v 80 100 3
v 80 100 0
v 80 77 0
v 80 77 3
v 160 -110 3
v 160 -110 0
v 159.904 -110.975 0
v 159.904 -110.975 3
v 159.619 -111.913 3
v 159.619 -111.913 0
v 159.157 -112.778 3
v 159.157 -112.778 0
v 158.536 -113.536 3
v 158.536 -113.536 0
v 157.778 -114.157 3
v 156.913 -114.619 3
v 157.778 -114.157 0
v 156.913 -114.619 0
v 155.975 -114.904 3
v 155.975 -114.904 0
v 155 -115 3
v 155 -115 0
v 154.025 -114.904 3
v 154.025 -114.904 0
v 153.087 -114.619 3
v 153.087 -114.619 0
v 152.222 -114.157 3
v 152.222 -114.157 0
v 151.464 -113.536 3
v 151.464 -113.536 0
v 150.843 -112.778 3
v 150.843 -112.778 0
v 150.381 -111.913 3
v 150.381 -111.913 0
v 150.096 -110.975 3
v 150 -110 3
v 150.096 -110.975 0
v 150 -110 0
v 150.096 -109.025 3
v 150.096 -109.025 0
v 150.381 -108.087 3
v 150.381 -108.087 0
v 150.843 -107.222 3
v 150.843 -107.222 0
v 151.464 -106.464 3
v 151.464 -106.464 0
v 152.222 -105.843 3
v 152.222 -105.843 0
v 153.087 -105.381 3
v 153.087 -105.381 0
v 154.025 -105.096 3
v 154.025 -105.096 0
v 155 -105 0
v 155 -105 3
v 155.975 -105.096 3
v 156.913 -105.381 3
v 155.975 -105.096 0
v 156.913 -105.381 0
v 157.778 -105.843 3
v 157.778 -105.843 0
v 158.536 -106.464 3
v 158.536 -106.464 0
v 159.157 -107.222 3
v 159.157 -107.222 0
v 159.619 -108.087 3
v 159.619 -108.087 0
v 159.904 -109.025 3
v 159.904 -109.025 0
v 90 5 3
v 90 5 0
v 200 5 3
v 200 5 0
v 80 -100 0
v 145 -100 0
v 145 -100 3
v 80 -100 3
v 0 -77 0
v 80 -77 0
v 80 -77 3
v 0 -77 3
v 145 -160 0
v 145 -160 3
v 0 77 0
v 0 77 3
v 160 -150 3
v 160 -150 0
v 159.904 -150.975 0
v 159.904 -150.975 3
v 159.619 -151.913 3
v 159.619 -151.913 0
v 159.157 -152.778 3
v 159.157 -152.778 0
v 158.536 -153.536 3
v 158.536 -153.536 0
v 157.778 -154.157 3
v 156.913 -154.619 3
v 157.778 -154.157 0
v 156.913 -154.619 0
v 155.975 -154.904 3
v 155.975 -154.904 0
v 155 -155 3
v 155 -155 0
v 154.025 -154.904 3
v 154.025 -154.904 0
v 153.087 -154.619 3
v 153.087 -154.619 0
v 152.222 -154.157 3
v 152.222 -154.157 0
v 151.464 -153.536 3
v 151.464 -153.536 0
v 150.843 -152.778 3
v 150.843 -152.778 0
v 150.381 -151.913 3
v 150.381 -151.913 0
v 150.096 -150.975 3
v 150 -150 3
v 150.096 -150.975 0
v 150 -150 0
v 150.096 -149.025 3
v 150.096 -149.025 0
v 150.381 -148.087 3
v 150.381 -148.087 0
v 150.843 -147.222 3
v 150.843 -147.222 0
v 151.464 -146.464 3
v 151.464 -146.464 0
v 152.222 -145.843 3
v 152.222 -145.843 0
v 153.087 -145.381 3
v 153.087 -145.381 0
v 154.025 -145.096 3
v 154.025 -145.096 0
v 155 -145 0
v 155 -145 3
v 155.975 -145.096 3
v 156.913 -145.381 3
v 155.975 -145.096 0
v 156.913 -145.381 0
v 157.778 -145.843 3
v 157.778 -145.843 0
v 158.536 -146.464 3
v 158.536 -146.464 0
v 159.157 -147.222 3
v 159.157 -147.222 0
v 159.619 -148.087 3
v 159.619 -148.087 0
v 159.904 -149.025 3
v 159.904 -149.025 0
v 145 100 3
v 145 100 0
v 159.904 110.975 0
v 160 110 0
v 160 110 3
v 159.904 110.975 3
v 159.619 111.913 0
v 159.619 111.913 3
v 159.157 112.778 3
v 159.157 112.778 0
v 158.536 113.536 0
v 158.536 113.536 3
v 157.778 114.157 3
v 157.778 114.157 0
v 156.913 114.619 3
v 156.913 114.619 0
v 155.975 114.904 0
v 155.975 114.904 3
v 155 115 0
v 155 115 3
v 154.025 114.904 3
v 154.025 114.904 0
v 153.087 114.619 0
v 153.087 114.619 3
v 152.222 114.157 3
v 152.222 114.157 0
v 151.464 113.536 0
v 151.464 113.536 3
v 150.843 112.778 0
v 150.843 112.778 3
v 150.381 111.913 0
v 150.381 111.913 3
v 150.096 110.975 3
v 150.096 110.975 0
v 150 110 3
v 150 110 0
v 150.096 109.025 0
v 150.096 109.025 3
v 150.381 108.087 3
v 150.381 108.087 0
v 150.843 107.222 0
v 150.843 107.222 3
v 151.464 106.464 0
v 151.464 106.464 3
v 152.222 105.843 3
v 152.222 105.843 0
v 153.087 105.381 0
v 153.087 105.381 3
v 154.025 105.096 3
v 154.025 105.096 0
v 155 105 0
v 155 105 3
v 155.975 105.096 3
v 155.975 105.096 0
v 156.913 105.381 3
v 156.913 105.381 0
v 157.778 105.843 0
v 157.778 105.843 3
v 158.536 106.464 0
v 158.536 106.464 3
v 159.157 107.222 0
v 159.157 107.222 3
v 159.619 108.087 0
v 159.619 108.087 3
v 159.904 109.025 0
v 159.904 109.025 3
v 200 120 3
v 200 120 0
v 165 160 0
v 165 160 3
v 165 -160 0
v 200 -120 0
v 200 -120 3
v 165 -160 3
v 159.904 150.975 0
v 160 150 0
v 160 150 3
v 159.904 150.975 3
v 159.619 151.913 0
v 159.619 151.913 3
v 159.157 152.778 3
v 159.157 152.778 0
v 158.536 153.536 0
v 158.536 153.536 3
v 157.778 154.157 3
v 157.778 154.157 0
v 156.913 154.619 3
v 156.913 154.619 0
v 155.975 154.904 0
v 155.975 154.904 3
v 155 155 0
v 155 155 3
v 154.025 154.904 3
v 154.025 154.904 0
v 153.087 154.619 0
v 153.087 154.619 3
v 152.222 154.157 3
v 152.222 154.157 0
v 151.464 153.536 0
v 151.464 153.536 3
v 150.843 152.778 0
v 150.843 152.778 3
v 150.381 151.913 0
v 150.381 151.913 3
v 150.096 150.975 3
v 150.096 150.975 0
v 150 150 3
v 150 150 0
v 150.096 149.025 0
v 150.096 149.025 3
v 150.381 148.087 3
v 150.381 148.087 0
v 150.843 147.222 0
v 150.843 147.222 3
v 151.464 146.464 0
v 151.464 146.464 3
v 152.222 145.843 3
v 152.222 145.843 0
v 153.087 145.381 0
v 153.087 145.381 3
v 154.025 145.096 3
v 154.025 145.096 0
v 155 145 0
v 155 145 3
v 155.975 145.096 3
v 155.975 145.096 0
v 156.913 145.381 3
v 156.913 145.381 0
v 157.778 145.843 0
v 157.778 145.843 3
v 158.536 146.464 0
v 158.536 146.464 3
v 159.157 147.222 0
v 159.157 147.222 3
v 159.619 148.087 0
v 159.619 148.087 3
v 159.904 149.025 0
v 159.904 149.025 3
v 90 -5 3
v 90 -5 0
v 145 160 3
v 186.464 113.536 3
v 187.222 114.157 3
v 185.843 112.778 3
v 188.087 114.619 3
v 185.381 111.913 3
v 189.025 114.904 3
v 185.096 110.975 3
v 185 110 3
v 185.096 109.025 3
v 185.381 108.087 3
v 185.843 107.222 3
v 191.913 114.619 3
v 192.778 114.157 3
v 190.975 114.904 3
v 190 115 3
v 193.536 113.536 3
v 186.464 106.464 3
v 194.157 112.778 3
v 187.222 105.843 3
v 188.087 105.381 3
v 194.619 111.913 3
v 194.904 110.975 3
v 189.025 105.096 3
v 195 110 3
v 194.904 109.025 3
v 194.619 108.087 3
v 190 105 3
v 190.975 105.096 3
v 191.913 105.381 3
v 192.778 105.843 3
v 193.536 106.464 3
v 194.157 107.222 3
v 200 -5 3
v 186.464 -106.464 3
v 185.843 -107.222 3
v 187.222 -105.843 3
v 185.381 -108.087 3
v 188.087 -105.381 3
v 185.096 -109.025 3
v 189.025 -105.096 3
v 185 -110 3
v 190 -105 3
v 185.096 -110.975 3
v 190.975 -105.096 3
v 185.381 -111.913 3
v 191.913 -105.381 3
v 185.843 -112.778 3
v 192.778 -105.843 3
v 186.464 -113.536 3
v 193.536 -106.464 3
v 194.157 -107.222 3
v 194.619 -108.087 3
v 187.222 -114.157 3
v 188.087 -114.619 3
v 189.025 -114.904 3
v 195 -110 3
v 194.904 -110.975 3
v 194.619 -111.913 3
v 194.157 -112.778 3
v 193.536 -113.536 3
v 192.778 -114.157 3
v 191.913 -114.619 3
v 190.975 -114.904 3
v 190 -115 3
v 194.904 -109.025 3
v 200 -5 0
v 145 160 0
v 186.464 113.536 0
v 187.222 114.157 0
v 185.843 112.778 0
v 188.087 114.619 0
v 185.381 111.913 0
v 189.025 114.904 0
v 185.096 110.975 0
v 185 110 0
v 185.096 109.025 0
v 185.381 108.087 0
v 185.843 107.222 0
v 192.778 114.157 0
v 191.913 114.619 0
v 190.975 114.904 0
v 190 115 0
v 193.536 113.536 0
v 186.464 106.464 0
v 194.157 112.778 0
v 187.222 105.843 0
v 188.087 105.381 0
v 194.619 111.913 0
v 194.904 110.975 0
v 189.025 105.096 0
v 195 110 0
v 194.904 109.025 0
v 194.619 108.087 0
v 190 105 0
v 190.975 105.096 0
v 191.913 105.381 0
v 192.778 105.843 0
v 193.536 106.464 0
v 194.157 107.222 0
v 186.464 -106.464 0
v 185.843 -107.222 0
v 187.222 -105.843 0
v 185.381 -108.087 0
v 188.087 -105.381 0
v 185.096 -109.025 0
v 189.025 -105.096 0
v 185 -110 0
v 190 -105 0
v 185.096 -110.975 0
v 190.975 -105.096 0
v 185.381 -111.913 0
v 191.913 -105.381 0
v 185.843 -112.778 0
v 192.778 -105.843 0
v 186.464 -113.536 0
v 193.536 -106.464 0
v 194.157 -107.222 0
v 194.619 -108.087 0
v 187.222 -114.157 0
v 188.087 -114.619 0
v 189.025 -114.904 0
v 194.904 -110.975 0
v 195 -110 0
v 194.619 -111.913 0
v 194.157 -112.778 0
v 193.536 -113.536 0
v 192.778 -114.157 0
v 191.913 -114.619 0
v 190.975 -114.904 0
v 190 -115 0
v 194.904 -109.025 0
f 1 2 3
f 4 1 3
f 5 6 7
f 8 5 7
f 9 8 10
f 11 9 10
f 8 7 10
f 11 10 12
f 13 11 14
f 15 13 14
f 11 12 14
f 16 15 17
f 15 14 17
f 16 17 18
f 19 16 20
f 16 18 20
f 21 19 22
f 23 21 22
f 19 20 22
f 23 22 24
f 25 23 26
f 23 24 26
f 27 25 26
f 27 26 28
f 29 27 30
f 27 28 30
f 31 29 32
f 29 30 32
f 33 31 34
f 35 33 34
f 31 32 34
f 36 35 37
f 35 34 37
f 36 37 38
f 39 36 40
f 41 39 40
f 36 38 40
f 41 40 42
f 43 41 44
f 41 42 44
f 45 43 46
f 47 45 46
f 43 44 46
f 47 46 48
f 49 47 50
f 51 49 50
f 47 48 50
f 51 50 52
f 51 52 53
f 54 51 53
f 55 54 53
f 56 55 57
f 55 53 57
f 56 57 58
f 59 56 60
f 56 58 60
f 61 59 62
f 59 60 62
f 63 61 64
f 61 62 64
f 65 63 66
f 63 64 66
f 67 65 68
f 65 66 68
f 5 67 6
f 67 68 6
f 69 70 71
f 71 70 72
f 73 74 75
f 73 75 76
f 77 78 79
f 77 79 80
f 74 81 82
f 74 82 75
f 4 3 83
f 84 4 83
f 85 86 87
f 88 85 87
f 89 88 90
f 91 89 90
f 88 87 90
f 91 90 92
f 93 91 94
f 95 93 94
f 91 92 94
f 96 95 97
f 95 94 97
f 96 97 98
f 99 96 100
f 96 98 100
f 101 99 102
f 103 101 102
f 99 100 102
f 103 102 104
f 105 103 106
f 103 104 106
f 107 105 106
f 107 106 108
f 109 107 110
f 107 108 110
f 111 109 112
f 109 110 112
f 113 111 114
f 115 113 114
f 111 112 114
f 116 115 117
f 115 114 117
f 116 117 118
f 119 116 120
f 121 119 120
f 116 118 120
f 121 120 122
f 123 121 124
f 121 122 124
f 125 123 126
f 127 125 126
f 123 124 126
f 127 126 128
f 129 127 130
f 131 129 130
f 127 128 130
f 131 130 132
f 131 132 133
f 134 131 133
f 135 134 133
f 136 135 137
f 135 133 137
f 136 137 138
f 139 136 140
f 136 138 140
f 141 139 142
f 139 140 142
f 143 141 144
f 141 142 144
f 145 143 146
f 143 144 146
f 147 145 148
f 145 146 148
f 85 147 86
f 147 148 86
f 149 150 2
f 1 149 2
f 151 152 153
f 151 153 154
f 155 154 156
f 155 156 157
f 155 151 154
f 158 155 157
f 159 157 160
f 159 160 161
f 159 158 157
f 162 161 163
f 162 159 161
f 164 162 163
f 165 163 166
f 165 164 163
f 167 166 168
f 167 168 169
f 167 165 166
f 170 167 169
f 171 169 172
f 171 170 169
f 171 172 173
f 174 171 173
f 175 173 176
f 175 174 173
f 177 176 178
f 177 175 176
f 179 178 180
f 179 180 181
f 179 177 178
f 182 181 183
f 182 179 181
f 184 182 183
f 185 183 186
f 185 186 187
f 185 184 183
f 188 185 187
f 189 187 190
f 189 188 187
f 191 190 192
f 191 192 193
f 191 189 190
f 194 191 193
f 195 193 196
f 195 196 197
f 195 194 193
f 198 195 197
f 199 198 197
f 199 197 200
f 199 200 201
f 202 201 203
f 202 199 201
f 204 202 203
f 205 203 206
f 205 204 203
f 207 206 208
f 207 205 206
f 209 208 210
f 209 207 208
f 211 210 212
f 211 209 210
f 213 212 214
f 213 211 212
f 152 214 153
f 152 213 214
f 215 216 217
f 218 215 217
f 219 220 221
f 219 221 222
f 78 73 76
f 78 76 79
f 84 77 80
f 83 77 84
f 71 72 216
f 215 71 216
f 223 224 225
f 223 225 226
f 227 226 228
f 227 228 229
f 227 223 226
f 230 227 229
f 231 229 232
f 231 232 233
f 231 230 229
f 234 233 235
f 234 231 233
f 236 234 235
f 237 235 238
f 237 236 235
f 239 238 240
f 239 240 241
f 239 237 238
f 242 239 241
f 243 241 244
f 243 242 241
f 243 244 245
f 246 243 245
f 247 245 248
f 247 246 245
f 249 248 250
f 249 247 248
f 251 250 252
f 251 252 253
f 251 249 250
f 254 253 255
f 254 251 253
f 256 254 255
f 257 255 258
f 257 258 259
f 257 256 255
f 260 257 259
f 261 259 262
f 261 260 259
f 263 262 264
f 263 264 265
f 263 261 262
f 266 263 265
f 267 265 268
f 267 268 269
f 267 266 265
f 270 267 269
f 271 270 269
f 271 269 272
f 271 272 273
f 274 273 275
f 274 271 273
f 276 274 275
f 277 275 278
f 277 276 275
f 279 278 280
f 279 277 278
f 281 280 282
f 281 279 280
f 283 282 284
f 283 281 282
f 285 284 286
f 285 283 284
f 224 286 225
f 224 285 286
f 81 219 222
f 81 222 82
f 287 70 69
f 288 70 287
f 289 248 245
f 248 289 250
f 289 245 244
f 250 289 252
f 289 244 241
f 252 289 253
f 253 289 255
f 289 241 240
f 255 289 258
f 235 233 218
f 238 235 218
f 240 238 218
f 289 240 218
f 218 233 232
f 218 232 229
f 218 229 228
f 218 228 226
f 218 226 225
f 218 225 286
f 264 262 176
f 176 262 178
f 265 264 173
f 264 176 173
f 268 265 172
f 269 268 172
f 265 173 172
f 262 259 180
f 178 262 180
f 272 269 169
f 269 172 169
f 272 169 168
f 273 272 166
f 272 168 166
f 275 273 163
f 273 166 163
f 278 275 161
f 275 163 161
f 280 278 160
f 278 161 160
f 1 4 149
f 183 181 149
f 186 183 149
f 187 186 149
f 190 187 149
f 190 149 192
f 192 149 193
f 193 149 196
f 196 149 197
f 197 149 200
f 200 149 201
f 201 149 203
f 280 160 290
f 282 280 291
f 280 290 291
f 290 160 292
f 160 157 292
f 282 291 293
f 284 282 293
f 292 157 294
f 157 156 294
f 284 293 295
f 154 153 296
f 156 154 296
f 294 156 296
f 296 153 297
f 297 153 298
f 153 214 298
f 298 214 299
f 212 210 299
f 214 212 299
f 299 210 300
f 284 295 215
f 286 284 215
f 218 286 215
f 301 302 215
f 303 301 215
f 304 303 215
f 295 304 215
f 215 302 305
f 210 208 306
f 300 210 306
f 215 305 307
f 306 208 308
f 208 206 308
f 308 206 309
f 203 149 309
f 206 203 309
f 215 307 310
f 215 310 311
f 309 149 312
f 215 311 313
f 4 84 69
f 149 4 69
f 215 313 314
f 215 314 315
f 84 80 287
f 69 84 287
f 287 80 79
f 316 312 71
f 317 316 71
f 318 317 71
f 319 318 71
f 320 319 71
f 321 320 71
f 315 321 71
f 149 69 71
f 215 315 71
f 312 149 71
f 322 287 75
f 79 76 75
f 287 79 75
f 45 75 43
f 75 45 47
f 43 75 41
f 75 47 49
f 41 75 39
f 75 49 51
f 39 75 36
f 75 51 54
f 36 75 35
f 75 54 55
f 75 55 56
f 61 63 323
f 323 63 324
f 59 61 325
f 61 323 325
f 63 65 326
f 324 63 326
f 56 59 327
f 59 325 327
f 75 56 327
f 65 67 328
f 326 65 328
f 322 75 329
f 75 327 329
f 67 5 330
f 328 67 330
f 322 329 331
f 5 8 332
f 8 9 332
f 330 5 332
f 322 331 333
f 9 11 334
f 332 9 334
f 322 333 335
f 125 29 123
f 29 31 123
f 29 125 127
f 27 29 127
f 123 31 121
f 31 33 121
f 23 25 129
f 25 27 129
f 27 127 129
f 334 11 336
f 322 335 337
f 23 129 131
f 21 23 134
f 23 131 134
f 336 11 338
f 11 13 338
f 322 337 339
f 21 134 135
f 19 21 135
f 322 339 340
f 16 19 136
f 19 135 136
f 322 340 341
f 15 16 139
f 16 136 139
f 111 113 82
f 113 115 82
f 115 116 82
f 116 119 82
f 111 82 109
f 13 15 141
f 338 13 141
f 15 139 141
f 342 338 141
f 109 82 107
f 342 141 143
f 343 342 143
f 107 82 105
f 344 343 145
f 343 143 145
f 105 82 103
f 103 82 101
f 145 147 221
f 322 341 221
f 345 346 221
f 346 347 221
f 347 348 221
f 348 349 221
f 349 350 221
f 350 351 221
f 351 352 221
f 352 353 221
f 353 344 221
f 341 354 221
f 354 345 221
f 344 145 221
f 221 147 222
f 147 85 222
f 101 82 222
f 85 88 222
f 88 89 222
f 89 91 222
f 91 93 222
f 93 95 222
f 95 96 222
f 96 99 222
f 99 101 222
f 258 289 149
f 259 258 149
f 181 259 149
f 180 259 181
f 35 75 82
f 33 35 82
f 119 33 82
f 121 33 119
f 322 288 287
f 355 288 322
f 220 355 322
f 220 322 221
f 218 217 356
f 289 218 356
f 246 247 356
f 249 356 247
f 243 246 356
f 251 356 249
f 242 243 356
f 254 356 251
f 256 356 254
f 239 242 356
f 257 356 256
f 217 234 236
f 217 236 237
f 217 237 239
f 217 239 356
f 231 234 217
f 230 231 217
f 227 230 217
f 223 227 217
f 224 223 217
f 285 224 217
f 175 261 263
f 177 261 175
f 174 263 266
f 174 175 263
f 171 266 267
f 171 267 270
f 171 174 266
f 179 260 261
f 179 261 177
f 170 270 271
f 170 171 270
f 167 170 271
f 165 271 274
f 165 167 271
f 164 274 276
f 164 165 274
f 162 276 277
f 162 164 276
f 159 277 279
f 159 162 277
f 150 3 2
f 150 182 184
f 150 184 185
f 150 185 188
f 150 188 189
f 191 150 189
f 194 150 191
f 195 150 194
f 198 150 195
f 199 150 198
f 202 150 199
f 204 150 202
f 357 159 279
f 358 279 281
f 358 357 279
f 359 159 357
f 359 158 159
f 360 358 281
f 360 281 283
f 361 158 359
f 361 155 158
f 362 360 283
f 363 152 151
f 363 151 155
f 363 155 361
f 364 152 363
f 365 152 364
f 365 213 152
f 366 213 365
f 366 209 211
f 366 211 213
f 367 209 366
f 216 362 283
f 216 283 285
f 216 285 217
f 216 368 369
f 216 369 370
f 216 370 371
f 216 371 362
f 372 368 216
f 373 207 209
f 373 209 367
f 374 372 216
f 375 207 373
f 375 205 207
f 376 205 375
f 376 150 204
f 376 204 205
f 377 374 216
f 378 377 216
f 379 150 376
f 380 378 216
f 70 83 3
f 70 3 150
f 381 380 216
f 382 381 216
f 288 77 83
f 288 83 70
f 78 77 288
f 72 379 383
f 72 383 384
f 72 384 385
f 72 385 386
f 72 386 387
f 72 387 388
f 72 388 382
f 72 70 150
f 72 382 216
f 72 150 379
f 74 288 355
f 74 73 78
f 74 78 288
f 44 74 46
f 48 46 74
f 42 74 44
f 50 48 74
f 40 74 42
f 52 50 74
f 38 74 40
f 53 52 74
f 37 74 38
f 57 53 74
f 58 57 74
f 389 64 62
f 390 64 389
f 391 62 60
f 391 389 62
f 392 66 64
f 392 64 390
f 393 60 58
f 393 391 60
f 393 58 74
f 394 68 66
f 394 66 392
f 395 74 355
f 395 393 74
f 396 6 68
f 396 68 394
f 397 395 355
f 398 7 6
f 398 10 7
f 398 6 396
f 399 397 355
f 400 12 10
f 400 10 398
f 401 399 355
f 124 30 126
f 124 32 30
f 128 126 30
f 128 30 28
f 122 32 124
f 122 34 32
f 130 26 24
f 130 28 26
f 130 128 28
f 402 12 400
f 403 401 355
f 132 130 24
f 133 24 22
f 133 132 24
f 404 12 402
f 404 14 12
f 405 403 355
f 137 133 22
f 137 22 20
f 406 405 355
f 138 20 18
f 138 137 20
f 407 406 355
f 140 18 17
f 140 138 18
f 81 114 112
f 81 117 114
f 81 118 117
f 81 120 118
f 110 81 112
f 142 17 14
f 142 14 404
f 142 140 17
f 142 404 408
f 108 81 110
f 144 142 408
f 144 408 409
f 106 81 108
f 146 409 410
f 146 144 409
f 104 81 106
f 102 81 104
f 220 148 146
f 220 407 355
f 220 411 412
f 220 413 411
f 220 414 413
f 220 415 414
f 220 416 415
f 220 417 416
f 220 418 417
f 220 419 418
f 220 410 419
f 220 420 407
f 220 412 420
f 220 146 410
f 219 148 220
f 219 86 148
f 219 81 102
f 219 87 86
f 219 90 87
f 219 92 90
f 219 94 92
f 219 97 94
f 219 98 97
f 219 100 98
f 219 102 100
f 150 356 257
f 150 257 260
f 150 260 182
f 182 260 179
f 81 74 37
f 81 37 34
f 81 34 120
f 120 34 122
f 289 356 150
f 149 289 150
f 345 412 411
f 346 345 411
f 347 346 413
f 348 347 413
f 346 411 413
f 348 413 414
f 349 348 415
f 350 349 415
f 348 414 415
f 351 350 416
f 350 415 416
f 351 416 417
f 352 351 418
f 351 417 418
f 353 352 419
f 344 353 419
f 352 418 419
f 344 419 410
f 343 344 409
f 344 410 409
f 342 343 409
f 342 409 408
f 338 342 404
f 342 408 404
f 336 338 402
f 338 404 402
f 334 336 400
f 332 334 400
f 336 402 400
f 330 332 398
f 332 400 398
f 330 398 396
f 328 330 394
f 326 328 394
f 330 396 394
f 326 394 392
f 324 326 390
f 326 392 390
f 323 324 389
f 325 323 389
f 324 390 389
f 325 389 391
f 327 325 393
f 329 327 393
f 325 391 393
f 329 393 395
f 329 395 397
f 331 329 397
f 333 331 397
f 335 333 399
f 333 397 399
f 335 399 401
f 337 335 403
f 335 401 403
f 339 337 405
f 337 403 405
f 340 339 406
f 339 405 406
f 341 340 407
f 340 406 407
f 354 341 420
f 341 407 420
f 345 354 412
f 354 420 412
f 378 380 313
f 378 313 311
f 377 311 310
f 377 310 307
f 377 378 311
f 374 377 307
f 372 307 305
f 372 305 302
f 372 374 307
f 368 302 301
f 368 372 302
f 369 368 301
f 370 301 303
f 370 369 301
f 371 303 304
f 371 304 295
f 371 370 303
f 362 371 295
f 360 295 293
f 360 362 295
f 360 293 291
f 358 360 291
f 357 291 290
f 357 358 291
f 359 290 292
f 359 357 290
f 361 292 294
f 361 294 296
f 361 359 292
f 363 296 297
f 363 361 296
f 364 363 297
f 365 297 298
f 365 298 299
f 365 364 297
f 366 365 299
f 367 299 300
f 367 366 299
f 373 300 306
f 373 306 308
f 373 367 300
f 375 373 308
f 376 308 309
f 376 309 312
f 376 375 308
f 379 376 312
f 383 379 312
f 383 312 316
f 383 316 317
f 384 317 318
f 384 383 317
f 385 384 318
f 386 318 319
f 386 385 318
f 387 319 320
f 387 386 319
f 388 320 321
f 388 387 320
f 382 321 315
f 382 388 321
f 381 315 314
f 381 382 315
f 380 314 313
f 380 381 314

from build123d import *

# Parameters (mm, degrees)
ESQUISSE1_R        = 5
BOSS_EXTRU_1_DEPTH = 3


with BuildPart() as part:
    # Esquisse1 → Boss.-Extru.1 (new body)
    with BuildSketch(Plane.XY):
        Polygon((80, 77), (0, 77), (0, 0), (90, 0), (90, 5), (200, 5), (200, 120), (165, 160), (145, 160), (145, 100), (80, 100), align=None)
        with Locations((155, 150)):
            Circle(ESQUISSE1_R, mode=Mode.SUBTRACT)
        with Locations((155, 110)):
            Circle(ESQUISSE1_R, mode=Mode.SUBTRACT)
        with Locations((190, 110)):
            Circle(ESQUISSE1_R, mode=Mode.SUBTRACT)
    boss_extru_1 = extrude(amount=BOSS_EXTRU_1_DEPTH)

    # Symétrie1: Boss.-Extru.1 across plane
    add(boss_extru_1.mirror(Plane(origin=(0, 0, 3), x_dir=(0, 0, 1), z_dir=(0, 1, 0))))


solid = part.part
